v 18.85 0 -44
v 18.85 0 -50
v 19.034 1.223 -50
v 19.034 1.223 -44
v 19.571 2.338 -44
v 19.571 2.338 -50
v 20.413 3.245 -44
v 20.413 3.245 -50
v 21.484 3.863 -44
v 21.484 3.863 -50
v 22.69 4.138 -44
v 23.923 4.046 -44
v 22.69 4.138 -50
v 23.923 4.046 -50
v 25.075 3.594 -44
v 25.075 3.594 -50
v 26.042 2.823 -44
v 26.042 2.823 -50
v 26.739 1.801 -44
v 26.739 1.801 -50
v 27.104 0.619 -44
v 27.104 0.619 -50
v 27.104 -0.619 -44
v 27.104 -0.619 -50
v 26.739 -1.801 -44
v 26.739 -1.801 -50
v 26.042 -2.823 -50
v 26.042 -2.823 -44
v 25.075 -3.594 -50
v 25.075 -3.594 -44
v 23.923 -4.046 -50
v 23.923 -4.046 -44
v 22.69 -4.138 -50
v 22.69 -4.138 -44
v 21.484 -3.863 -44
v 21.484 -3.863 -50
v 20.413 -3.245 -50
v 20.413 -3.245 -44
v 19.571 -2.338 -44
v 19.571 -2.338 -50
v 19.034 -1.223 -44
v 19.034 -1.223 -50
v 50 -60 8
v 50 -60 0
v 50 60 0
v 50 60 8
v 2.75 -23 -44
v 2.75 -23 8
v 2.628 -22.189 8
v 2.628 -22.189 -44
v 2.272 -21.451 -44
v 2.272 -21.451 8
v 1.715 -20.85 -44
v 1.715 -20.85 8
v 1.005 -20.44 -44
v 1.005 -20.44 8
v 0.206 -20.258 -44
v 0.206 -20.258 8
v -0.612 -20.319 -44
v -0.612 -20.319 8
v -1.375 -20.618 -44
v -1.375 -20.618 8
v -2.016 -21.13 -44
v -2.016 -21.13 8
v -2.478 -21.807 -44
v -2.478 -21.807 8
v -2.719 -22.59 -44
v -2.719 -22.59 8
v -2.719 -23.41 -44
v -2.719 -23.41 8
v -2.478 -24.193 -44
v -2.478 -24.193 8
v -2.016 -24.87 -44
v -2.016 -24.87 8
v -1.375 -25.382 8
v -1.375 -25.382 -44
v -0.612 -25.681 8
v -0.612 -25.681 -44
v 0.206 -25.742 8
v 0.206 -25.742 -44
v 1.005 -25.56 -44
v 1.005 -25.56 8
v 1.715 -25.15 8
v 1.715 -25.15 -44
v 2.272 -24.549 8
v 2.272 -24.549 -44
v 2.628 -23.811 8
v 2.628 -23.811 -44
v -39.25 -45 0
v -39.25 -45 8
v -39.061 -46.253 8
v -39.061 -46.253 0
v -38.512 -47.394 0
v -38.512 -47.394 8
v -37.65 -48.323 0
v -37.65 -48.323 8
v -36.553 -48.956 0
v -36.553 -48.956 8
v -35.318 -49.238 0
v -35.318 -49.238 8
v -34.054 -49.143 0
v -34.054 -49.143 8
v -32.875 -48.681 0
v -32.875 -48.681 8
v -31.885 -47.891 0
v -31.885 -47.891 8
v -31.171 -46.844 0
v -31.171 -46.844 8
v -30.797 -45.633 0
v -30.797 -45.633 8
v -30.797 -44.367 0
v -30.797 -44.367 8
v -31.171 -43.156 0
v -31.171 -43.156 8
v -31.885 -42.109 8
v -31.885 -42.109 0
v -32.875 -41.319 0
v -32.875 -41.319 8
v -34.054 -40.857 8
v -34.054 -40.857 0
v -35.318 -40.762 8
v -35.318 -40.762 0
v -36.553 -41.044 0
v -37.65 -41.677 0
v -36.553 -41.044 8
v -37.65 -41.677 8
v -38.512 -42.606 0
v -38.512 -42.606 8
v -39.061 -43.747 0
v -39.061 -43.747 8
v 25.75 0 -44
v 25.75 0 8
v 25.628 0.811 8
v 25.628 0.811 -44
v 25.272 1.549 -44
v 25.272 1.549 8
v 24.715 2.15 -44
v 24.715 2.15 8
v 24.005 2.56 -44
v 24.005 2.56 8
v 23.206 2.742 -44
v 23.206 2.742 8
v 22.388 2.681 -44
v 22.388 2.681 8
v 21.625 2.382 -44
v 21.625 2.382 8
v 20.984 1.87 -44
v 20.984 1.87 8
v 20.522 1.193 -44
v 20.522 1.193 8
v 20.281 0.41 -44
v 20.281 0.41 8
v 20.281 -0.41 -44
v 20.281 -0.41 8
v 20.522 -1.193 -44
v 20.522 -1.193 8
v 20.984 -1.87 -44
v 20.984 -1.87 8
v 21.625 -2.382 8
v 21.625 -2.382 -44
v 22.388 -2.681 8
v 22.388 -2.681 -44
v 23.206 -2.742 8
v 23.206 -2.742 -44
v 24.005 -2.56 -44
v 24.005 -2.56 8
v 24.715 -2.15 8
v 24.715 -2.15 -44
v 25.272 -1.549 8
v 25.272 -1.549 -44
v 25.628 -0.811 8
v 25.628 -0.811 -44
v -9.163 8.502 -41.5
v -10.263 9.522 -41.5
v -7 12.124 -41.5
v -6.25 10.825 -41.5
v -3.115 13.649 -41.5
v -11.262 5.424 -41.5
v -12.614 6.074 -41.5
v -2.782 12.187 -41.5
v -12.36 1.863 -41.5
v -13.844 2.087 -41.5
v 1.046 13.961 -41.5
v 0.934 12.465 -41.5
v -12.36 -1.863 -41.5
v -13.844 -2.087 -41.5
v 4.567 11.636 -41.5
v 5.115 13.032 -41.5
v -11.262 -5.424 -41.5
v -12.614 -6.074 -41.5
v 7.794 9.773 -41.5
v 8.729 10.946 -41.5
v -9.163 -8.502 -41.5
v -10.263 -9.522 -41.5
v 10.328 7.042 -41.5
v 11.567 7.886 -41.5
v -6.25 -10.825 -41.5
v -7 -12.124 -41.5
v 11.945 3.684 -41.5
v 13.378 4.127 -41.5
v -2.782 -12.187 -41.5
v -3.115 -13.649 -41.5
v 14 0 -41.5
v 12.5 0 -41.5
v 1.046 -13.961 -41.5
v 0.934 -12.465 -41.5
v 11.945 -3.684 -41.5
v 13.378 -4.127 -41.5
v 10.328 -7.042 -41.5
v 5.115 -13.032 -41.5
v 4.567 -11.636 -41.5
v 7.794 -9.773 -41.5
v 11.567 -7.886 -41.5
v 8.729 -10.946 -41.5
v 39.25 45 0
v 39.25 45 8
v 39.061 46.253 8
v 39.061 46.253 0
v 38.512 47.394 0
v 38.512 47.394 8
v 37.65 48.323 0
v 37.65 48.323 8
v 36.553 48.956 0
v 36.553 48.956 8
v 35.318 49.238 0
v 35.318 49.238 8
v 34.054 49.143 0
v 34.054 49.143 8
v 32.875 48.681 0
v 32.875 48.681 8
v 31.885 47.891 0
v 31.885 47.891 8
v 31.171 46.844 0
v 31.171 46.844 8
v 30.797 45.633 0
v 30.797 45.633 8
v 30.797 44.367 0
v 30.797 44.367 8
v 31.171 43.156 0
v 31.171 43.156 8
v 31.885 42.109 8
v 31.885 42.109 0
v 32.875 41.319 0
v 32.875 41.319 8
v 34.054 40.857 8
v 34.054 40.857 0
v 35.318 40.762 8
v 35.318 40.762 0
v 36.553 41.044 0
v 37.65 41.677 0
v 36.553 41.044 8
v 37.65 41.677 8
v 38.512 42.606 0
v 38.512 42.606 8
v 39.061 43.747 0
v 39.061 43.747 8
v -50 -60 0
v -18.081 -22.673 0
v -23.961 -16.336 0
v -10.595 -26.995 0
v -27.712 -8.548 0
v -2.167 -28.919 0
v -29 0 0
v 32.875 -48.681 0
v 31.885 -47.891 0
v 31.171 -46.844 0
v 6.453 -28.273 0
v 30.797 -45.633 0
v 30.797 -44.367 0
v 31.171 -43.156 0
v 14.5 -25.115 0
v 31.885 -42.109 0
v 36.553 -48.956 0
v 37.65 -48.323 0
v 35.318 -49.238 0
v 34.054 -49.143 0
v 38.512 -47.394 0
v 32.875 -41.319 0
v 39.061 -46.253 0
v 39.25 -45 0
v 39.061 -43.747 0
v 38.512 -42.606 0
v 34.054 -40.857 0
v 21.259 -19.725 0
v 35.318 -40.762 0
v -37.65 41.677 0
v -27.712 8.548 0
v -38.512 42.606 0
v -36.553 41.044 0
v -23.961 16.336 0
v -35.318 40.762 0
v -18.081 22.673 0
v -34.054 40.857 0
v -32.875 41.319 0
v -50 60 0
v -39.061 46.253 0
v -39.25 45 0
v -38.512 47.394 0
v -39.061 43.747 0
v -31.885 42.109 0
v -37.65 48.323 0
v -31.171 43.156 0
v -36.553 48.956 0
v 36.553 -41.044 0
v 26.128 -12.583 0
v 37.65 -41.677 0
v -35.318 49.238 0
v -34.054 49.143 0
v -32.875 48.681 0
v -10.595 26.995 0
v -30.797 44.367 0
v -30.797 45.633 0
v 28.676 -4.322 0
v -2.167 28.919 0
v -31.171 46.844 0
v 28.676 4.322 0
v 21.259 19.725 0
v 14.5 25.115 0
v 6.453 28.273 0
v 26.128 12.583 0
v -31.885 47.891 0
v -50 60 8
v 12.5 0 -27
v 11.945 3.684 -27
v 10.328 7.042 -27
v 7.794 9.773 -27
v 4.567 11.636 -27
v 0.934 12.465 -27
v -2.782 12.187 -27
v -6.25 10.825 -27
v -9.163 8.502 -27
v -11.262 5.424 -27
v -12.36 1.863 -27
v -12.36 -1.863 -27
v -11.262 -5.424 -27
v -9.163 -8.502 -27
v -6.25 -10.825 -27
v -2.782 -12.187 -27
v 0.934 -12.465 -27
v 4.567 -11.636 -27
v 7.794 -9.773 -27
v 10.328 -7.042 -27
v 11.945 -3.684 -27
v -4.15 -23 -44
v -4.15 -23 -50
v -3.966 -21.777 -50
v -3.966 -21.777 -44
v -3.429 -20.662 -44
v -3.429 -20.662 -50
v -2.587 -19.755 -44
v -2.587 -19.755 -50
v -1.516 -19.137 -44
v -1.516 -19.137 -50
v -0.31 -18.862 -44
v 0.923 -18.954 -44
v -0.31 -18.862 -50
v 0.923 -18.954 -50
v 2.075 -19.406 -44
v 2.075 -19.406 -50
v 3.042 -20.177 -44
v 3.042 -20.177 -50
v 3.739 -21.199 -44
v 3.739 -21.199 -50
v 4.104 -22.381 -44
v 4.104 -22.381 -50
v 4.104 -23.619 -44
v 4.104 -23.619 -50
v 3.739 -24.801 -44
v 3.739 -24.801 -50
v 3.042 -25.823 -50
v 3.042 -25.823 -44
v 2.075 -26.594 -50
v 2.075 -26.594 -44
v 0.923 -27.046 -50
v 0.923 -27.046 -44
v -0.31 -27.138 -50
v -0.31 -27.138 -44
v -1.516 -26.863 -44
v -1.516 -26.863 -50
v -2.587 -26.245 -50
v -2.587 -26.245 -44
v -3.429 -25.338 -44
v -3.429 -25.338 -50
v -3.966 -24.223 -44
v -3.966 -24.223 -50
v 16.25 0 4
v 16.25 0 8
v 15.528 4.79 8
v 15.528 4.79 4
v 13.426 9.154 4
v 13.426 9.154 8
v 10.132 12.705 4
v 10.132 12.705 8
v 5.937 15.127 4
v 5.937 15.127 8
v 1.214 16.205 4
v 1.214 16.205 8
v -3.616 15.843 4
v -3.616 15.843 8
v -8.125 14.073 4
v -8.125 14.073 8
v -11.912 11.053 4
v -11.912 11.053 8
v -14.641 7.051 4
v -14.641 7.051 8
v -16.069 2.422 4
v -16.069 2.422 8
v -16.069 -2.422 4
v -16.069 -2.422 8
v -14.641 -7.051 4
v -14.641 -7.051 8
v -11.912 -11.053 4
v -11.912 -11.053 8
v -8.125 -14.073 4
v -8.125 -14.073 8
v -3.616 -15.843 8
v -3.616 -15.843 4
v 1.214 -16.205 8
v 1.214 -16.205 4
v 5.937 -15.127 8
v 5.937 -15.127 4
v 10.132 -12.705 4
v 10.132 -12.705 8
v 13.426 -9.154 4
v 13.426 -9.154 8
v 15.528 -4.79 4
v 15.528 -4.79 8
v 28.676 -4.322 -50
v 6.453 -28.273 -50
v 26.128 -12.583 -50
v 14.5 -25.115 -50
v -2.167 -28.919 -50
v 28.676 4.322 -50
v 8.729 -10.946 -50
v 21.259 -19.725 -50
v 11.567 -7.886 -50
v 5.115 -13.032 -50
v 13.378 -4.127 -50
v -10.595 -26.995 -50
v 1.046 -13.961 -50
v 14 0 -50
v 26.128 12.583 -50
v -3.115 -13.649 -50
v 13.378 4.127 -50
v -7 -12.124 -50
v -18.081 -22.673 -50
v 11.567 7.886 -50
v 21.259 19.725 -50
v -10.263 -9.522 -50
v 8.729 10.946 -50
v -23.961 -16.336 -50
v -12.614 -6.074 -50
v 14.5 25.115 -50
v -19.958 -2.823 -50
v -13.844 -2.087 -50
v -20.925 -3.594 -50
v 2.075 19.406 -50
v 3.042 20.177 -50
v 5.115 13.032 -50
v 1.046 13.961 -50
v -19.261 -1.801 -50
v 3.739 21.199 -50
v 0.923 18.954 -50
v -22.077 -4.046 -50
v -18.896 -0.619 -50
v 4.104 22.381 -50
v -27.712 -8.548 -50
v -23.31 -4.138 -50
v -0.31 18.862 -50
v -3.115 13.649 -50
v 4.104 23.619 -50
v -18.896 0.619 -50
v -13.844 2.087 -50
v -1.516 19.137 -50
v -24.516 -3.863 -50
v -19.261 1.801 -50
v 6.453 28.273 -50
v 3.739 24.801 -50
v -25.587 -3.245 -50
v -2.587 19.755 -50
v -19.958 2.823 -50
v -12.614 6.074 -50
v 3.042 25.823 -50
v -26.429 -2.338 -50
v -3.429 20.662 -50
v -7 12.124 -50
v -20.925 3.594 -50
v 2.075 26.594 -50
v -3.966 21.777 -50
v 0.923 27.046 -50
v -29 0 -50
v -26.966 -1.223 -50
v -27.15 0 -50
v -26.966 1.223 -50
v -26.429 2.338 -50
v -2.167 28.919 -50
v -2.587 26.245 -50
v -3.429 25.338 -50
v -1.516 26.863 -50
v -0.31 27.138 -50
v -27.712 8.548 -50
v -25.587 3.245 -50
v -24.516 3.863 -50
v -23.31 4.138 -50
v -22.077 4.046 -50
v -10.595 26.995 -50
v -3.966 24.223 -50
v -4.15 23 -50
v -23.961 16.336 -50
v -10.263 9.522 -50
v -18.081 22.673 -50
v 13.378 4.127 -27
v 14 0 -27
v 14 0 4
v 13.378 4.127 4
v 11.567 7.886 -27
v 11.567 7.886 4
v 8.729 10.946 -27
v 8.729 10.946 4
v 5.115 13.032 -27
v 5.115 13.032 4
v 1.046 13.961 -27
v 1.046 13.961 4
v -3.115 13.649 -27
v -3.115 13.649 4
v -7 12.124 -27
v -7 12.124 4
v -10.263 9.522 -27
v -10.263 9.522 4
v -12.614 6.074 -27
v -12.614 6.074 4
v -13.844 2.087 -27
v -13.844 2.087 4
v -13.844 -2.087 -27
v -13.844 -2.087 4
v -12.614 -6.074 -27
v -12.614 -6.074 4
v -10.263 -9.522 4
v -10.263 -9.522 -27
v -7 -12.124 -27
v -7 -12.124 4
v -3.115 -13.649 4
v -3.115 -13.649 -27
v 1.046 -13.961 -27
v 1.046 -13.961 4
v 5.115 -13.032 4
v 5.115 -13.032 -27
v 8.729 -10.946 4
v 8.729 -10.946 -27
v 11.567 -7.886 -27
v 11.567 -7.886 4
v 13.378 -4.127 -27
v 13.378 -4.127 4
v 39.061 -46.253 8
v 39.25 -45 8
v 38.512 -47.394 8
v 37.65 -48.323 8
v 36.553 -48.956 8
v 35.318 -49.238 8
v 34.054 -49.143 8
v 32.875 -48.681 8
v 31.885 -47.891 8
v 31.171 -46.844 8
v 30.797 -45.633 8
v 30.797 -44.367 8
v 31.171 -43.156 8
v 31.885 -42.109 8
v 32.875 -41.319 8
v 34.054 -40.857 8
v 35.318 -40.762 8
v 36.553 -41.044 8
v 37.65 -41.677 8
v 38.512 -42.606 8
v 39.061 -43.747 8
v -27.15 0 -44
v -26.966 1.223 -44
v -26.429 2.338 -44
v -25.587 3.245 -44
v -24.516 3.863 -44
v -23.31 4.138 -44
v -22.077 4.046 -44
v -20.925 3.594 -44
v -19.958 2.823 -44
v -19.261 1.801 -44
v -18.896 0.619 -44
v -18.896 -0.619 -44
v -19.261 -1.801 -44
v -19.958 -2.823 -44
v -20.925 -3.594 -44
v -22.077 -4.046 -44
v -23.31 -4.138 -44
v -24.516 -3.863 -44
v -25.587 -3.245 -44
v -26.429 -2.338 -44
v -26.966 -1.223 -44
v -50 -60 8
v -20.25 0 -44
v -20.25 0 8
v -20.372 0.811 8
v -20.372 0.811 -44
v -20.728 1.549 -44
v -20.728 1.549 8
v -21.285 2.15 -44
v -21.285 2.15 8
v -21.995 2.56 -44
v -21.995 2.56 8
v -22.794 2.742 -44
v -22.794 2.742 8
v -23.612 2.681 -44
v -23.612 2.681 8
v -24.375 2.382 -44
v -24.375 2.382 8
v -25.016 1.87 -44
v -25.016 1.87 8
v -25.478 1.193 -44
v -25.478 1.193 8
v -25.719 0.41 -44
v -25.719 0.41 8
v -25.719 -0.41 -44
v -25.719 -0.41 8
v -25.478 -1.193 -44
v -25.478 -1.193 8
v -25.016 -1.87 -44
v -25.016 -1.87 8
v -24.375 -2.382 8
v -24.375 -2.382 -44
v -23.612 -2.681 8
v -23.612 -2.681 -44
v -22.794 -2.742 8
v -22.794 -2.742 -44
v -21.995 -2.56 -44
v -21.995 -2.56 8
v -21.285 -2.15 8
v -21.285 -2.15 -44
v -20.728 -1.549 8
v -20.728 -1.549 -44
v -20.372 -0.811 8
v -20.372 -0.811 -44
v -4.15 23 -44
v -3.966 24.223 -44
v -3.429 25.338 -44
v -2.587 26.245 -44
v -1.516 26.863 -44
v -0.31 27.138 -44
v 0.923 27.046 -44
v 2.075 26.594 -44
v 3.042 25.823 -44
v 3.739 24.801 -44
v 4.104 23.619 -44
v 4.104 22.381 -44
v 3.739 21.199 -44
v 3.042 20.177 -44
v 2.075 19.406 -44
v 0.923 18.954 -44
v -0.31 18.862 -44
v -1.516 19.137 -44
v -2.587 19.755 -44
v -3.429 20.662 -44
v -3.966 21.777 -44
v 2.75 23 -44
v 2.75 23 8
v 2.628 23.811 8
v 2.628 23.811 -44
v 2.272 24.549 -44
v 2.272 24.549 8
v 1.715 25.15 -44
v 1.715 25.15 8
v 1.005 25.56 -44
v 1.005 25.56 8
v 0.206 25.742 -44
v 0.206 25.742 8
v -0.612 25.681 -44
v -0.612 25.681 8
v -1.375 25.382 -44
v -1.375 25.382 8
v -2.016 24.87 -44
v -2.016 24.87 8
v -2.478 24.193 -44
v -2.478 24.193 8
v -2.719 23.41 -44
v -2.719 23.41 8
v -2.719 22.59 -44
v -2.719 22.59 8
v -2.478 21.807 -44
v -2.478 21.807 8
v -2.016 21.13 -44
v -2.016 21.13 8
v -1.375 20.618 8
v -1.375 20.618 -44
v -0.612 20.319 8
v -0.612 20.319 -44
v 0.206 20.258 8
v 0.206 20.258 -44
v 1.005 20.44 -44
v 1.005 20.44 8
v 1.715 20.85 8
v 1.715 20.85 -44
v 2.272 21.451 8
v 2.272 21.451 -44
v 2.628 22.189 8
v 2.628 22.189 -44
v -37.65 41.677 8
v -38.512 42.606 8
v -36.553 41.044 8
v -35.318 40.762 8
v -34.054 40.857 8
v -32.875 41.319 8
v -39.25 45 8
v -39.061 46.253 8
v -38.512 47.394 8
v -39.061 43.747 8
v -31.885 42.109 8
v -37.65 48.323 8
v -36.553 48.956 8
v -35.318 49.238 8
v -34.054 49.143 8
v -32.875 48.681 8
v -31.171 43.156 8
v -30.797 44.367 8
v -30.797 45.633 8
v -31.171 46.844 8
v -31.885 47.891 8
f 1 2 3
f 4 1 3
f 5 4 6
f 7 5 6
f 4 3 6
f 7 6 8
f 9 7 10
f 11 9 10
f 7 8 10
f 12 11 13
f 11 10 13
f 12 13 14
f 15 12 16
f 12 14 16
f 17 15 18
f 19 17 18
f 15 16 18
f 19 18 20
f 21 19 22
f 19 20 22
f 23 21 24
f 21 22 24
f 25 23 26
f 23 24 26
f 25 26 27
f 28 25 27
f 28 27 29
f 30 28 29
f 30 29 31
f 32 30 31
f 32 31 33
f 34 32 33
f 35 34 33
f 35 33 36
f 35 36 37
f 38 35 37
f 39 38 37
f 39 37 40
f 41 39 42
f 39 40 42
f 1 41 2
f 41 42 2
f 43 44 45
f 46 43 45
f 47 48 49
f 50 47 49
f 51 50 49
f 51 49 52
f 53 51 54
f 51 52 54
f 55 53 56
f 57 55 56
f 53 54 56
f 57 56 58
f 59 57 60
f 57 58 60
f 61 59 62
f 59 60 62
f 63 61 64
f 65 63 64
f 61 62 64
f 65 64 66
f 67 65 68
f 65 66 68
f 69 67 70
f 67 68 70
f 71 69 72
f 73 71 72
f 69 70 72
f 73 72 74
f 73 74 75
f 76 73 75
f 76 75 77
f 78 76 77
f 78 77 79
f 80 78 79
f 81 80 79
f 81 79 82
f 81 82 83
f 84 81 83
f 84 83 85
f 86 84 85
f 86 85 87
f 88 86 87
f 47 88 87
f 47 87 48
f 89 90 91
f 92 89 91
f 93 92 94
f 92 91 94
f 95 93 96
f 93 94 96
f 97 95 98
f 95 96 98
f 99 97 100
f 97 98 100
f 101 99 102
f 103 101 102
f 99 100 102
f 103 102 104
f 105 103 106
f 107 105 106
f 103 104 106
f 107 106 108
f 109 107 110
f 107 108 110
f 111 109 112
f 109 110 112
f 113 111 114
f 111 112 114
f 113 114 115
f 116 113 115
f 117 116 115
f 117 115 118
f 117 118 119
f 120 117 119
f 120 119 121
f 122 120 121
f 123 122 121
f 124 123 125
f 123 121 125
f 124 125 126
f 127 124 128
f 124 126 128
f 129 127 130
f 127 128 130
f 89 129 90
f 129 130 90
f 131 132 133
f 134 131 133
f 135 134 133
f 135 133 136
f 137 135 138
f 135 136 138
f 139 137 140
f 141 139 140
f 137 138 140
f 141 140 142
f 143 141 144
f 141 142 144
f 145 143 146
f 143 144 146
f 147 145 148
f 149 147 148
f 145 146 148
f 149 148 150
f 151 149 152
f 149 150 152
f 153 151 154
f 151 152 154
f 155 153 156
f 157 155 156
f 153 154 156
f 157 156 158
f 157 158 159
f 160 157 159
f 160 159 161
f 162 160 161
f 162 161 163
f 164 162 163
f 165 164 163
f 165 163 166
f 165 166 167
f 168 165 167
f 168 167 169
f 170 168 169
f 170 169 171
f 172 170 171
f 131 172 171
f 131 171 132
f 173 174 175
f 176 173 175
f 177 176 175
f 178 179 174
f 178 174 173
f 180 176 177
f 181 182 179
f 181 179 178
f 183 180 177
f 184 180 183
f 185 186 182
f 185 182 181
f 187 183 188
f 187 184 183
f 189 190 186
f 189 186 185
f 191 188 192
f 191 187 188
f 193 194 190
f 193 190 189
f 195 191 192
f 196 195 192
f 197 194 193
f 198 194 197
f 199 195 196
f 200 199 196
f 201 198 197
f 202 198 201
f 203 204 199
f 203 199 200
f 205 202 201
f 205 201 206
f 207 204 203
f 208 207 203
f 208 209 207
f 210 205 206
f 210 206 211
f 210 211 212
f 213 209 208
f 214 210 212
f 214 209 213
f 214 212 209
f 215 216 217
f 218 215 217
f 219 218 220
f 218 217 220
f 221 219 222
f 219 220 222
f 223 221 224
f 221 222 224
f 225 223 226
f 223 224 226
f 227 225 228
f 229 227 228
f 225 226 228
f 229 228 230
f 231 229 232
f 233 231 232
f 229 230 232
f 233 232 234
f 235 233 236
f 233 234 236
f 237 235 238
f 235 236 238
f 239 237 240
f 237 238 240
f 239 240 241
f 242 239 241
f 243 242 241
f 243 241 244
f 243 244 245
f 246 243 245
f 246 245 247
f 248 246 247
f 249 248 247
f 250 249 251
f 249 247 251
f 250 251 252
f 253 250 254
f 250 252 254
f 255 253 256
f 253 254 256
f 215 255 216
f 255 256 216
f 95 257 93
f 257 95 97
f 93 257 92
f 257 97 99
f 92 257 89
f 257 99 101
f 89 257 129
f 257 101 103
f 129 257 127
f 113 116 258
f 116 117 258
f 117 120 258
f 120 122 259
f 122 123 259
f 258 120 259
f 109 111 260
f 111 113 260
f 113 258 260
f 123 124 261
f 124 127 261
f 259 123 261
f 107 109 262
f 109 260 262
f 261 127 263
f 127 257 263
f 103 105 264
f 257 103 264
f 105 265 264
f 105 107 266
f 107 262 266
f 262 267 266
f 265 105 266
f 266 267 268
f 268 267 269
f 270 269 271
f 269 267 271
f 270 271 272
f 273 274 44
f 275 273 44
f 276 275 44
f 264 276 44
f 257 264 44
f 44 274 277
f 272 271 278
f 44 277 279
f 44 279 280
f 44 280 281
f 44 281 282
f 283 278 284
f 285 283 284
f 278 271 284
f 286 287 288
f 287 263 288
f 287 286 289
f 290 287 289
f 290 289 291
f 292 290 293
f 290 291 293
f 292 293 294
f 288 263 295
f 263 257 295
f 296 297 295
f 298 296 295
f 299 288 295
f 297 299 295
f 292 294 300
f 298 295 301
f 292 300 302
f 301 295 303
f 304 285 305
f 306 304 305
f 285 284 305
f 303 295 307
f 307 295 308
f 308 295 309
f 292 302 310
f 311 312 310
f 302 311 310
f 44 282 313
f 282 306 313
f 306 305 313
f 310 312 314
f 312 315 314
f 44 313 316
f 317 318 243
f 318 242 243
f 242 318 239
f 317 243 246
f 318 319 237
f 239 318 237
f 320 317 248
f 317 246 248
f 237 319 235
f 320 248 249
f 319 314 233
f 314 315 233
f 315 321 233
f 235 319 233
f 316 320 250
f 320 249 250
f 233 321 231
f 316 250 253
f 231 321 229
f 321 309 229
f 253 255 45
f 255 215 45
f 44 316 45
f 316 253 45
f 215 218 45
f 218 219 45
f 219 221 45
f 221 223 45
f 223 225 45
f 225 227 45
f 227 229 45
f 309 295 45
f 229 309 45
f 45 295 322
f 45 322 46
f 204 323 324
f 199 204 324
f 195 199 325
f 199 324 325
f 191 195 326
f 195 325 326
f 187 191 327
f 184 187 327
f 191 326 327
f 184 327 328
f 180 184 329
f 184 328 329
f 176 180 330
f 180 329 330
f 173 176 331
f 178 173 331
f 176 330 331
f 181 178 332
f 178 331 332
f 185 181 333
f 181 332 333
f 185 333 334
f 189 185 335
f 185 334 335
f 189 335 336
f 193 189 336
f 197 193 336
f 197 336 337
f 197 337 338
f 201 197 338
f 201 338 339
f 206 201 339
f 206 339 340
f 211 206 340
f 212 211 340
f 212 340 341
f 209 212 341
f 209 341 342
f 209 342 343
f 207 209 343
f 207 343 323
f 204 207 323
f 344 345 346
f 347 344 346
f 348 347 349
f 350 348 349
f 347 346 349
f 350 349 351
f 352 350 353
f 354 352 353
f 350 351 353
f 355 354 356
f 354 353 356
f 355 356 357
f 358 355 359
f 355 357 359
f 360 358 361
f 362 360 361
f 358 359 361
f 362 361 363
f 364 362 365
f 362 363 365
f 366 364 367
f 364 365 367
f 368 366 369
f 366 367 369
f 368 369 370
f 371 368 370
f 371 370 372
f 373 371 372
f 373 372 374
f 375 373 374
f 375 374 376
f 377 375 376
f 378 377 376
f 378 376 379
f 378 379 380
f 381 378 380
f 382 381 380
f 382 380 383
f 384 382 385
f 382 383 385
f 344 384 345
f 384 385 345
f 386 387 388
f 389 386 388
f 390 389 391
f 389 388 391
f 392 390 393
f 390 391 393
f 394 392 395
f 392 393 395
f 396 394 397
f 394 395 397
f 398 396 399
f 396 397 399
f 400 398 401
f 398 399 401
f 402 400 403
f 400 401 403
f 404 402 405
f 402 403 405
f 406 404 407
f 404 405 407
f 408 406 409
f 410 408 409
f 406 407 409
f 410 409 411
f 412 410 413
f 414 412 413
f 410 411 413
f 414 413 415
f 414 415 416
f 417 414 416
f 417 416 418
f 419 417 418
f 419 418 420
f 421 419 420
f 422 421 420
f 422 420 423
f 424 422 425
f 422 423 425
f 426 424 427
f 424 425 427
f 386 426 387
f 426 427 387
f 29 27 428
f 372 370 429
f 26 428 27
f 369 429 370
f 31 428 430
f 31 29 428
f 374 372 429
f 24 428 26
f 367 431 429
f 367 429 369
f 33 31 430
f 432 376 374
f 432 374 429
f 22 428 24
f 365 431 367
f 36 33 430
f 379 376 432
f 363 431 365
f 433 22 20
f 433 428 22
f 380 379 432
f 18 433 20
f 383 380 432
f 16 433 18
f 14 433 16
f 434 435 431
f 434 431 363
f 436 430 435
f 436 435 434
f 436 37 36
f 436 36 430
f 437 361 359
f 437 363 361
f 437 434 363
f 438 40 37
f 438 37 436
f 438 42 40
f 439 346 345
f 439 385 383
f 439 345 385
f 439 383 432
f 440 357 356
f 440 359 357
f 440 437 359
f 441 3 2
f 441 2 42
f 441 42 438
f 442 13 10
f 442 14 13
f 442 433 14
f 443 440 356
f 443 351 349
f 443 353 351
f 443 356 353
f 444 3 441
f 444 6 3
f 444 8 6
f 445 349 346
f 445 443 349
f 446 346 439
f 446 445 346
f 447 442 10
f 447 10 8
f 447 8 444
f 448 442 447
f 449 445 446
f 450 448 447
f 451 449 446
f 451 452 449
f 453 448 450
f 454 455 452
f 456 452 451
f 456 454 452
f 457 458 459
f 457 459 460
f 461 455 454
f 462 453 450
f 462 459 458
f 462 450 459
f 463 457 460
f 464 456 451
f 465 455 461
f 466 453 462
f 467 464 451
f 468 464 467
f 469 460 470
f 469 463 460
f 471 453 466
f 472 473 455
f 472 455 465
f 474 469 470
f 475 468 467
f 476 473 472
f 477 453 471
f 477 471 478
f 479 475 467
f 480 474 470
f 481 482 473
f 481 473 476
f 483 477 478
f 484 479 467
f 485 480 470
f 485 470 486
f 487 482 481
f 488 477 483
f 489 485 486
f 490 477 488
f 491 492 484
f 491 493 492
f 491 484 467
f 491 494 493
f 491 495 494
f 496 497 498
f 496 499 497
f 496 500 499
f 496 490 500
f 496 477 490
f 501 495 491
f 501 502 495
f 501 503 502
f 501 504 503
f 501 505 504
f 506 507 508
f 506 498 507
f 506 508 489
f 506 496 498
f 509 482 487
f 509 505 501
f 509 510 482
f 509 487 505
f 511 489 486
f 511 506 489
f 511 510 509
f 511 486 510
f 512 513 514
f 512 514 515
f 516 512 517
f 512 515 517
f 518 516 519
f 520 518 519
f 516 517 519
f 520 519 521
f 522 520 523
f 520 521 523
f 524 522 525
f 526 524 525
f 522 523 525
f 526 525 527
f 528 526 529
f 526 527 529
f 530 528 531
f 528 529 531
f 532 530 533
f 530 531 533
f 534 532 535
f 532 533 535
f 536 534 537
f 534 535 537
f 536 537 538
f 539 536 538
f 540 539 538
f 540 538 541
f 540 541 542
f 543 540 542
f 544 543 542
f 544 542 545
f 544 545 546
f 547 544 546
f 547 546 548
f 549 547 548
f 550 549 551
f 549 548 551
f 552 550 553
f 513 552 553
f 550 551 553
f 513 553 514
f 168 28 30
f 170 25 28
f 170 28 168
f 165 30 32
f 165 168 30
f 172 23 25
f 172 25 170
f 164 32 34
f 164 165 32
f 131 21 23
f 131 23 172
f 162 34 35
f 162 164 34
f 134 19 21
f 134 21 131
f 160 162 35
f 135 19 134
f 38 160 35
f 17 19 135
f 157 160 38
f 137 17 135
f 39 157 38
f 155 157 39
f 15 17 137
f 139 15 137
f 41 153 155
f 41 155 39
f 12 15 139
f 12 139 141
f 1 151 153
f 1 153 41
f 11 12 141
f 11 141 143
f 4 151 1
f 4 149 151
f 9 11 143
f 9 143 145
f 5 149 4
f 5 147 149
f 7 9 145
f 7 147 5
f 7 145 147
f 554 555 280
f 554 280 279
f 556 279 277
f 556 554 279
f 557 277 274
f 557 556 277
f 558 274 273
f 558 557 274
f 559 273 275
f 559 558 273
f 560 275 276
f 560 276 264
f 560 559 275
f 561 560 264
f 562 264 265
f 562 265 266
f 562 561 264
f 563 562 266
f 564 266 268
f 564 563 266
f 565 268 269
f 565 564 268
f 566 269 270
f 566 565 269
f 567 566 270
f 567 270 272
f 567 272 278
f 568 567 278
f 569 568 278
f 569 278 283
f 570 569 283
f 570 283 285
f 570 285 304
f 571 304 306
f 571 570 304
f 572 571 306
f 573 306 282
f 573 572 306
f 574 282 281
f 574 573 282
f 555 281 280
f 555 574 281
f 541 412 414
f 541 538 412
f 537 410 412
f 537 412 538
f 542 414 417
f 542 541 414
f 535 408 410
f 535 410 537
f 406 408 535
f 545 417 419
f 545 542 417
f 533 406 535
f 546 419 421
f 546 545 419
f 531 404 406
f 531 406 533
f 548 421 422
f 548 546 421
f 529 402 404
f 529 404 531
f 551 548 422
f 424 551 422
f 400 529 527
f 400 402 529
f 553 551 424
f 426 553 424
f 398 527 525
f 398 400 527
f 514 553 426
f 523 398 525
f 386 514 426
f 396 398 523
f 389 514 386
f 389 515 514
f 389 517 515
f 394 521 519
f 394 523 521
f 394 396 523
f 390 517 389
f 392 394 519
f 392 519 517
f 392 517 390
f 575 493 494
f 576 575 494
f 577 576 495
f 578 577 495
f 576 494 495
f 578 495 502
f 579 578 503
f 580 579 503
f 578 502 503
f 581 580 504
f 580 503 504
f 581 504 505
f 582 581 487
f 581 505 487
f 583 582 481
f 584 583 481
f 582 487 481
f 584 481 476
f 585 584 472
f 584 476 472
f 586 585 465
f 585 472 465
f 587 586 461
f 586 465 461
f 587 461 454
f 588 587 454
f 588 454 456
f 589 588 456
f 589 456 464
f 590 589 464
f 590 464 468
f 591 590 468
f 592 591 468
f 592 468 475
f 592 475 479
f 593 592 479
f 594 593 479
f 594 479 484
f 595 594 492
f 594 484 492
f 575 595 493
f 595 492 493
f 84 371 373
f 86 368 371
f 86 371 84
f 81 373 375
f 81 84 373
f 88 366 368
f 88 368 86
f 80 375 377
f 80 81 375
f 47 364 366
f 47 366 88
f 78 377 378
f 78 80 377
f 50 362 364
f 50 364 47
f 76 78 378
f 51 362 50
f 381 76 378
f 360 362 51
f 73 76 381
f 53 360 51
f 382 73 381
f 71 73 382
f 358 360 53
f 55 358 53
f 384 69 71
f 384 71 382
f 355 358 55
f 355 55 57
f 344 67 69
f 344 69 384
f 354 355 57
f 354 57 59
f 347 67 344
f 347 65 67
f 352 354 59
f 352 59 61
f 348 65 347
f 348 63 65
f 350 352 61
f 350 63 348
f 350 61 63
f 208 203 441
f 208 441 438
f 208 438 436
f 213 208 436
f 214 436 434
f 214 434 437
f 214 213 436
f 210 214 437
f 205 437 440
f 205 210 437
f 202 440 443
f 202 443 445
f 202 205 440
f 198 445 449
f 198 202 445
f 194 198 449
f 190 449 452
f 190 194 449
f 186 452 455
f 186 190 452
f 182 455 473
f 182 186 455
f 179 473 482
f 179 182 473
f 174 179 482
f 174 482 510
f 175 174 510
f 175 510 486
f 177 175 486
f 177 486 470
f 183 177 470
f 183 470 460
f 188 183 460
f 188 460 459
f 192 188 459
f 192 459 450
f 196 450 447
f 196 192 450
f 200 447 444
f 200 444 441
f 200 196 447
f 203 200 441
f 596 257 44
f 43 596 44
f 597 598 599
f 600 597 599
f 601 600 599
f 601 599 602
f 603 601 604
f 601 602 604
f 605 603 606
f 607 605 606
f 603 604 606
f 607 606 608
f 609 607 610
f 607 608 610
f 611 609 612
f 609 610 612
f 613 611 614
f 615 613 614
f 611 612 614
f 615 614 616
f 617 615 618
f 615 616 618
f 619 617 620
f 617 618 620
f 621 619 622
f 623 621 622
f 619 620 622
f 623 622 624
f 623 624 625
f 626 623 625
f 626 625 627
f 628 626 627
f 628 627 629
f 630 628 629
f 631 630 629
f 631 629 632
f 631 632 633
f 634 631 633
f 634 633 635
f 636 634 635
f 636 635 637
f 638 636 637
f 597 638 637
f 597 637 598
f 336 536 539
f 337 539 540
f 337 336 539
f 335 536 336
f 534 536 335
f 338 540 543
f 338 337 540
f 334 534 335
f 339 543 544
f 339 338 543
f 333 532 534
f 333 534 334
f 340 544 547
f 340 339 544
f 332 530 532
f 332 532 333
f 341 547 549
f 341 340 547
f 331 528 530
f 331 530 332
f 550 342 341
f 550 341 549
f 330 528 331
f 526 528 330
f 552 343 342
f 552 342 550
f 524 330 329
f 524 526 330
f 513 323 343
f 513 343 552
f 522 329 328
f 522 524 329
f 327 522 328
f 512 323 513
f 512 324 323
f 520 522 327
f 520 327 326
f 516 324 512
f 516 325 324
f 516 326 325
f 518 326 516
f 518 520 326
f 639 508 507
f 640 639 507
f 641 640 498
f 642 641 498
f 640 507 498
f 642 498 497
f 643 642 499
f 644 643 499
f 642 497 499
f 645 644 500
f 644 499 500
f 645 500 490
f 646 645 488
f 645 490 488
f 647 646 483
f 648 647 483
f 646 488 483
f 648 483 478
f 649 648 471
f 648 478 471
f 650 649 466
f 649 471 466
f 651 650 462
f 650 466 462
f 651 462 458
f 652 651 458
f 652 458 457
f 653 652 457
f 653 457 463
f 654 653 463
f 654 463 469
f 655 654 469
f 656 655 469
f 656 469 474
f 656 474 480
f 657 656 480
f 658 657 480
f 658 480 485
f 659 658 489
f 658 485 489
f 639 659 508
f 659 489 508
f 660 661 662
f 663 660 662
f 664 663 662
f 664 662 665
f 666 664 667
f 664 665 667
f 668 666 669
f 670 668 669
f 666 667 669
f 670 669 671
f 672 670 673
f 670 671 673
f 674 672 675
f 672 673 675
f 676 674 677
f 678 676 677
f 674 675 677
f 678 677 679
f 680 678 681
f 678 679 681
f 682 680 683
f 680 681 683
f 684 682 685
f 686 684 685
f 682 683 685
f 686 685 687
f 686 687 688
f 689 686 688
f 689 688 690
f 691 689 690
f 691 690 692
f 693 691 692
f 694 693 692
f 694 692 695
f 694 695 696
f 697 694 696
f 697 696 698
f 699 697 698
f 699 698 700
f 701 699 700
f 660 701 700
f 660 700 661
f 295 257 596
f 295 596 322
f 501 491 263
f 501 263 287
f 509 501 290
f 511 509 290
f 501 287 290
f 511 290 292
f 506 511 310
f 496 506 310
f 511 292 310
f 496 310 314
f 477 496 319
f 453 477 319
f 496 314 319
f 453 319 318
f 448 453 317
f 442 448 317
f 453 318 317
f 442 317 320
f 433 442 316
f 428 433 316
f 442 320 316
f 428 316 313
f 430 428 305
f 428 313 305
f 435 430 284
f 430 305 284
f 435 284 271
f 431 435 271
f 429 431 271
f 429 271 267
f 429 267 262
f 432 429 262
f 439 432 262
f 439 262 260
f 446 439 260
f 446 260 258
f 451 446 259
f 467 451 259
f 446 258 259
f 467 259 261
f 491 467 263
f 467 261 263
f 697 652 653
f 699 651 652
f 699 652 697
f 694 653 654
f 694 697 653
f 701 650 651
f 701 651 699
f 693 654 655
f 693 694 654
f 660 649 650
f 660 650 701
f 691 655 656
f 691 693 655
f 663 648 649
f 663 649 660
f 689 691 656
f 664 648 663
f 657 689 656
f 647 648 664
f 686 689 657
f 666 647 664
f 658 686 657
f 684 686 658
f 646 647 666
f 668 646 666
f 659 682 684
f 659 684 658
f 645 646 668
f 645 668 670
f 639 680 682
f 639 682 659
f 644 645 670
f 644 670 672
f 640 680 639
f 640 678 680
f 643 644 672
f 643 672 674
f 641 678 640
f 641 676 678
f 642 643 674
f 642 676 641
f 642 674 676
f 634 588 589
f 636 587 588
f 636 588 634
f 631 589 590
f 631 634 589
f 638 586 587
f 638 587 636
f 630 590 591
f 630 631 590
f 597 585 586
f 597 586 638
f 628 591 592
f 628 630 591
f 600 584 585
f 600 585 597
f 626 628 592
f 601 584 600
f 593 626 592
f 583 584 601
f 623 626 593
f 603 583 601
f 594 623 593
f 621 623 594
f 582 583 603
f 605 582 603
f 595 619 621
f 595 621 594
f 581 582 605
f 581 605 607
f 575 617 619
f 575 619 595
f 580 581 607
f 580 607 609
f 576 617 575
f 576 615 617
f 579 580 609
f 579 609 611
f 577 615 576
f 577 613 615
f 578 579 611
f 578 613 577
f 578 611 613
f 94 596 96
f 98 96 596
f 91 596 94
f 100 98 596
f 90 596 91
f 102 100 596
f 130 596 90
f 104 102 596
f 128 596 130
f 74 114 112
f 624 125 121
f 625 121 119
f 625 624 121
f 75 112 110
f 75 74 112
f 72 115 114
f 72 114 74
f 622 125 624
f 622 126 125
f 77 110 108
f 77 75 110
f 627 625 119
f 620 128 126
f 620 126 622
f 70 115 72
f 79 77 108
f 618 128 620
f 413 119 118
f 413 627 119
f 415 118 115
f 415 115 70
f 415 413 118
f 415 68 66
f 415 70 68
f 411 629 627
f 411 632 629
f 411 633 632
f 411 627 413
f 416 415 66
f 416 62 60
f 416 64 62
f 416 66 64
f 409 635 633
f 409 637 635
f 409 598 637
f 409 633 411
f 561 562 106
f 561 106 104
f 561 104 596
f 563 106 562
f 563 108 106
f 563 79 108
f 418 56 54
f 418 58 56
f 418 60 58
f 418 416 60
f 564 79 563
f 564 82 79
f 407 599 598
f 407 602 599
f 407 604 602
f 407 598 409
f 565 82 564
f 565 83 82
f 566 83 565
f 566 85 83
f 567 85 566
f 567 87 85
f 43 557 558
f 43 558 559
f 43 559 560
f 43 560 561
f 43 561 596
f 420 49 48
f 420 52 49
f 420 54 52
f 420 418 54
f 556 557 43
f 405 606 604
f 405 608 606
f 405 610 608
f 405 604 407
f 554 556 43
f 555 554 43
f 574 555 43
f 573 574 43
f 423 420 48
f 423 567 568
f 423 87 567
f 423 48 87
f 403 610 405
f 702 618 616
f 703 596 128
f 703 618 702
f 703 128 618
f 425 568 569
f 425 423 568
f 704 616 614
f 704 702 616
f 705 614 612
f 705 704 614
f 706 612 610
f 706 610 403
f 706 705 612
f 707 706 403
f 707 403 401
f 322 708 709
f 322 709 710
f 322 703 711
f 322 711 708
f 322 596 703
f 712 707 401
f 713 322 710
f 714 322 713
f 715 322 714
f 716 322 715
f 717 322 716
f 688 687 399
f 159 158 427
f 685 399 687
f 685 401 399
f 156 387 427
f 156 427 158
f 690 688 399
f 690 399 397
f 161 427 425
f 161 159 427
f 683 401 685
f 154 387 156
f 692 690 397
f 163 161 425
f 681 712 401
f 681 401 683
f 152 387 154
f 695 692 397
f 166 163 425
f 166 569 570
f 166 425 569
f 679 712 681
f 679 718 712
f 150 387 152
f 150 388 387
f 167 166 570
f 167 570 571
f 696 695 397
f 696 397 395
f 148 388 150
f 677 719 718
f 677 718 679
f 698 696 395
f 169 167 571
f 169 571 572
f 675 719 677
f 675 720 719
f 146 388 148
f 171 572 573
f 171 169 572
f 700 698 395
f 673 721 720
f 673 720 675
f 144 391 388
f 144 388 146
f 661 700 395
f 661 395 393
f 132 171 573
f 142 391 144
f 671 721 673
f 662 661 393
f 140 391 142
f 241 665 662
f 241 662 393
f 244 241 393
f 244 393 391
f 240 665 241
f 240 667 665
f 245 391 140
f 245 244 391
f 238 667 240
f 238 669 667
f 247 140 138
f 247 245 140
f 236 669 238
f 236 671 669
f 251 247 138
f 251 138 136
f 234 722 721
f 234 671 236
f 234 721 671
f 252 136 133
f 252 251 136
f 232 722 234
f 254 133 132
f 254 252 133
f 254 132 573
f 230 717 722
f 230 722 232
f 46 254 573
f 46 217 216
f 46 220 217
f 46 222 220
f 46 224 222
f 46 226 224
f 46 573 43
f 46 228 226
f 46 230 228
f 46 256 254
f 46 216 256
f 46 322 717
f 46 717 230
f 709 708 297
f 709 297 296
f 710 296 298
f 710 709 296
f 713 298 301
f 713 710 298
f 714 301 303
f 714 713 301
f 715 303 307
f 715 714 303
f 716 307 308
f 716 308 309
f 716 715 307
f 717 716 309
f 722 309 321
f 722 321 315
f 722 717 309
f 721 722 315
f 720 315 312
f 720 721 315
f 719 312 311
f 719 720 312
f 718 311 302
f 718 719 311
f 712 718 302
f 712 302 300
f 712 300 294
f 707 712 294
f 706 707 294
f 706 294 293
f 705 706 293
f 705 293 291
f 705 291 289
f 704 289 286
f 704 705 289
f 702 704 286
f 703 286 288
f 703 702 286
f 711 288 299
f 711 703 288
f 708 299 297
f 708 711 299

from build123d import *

# Parameters (mm, degrees)
SKETCH1_W               = 100
SKETCH1_H               = 120
BOSS_EXTRUDE1_DEPTH     = 8
SKETCH2_R               = 4.25
CUT_EXTRUDE1_DEPTH      = 8
MIRROR2_COPY_1_SKETCH_R = 4.25
MIRROR2_COPY_1_DEPTH    = 8
SKETCH3_R               = 16.25
CUT_EXTRUDE2_DEPTH      = 4
SKETCH4_R               = 29
BOSS_EXTRUDE2_DEPTH     = 50
SKETCH5_R               = 2.75
CUT_EXTRUDE3_DEPTH      = 70
SKETCH6_R               = 14
CUT_EXTRUDE4_DEPTH      = 31
SKETCH7_R               = 12.5
CUT_EXTRUDE5_DEPTH      = 61
SKETCH8_R               = 4.15
CUT_EXTRUDE6_DEPTH      = 6
CUT_EXTRUDE7_START      = -8.5
SKETCH9_R               = 14
CUT_EXTRUDE7_DEPTH      = 8.5


with BuildPart() as part:
    # Sketch1 → Boss-Extrude1 (new body)
    with BuildSketch(Plane.XY):
        Rectangle(SKETCH1_W, SKETCH1_H)
    extrude(amount=BOSS_EXTRUDE1_DEPTH)

    # Sketch2 → Cut-Extrude1 (cut)
    with BuildSketch(Plane.XY.offset(8)):
        with Locations((35, 45)):
            Circle(SKETCH2_R)
    cut_extrude1 = extrude(amount=-CUT_EXTRUDE1_DEPTH, mode=Mode.SUBTRACT)

    # Mirror1: Cut-Extrude1 across plane
    add(cut_extrude1.mirror(Plane(origin=(0, 0, 0), x_dir=(0, 0, 1), z_dir=(1, 0, 0))), mode=Mode.SUBTRACT)

    # Mirror2: Cut-Extrude1 across plane
    add(cut_extrude1.mirror(Plane.ZX), mode=Mode.SUBTRACT)

    # Mirror2 copy 1 sketch → Mirror2 copy 1 (cut)
    with BuildSketch(Plane(origin=(0, 0, 8), x_dir=(-1, 0, 0), z_dir=(0, 0, 1))):
        with Locations((35, 45)):
            Circle(MIRROR2_COPY_1_SKETCH_R)
    extrude(amount=-MIRROR2_COPY_1_DEPTH, mode=Mode.SUBTRACT)

    # Sketch3 → Cut-Extrude2 (cut)
    with BuildSketch(Plane.XY.offset(8)):
        Circle(SKETCH3_R)
    extrude(amount=-CUT_EXTRUDE2_DEPTH, mode=Mode.SUBTRACT)

    # Sketch4 → Boss-Extrude2 (add)
    with BuildSketch(Plane(origin=(0, 0, 0), x_dir=(-1, 0, 0), z_dir=(0, 0, -1))):
        Circle(SKETCH4_R)
    extrude(amount=BOSS_EXTRUDE2_DEPTH)

    # Sketch5 → Cut-Extrude3 (cut)
    with BuildSketch(Plane.XY.offset(8)):
        with Locations((0, 23)):
            Circle(SKETCH5_R)
        with Locations((23, 0)):
            Circle(SKETCH5_R)
        with Locations((0, -23)):
            Circle(SKETCH5_R)
        with Locations((-23, 0)):
            Circle(SKETCH5_R)
    extrude(amount=-CUT_EXTRUDE3_DEPTH, mode=Mode.SUBTRACT)

    # Sketch6 → Cut-Extrude4 (cut)
    with BuildSketch(Plane.XY.offset(4)):
        Circle(SKETCH6_R)
    extrude(amount=-CUT_EXTRUDE4_DEPTH, mode=Mode.SUBTRACT)

    # Sketch7 → Cut-Extrude5 (cut)
    with BuildSketch(Plane.XY.offset(-27)):
        Circle(SKETCH7_R)
    extrude(amount=-CUT_EXTRUDE5_DEPTH, mode=Mode.SUBTRACT)

    # Sketch8 → Cut-Extrude6 (cut)
    with BuildSketch(Plane(origin=(0, 0, -50), x_dir=(-1, 0, 0), z_dir=(0, 0, -1))):
        with Locations((0, 23)):
            Circle(SKETCH8_R)
        with Locations((23, 0)):
            Circle(SKETCH8_R)
        with Locations((0, -23)):
            Circle(SKETCH8_R)
        with Locations((-23, 0)):
            Circle(SKETCH8_R)
    extrude(amount=-CUT_EXTRUDE6_DEPTH, mode=Mode.SUBTRACT)

    # Sketch9 → Cut-Extrude7 (cut)
    with BuildSketch(Plane(origin=(0, 0, -50), x_dir=(-1, 0, 0), z_dir=(0, 0, -1)).offset(CUT_EXTRUDE7_START)):
        with Locations(Location((0, 0, 0), (0, 0, 180))):
            Circle(SKETCH9_R)
    extrude(amount=CUT_EXTRUDE7_DEPTH, mode=Mode.SUBTRACT)


solid = part.part
